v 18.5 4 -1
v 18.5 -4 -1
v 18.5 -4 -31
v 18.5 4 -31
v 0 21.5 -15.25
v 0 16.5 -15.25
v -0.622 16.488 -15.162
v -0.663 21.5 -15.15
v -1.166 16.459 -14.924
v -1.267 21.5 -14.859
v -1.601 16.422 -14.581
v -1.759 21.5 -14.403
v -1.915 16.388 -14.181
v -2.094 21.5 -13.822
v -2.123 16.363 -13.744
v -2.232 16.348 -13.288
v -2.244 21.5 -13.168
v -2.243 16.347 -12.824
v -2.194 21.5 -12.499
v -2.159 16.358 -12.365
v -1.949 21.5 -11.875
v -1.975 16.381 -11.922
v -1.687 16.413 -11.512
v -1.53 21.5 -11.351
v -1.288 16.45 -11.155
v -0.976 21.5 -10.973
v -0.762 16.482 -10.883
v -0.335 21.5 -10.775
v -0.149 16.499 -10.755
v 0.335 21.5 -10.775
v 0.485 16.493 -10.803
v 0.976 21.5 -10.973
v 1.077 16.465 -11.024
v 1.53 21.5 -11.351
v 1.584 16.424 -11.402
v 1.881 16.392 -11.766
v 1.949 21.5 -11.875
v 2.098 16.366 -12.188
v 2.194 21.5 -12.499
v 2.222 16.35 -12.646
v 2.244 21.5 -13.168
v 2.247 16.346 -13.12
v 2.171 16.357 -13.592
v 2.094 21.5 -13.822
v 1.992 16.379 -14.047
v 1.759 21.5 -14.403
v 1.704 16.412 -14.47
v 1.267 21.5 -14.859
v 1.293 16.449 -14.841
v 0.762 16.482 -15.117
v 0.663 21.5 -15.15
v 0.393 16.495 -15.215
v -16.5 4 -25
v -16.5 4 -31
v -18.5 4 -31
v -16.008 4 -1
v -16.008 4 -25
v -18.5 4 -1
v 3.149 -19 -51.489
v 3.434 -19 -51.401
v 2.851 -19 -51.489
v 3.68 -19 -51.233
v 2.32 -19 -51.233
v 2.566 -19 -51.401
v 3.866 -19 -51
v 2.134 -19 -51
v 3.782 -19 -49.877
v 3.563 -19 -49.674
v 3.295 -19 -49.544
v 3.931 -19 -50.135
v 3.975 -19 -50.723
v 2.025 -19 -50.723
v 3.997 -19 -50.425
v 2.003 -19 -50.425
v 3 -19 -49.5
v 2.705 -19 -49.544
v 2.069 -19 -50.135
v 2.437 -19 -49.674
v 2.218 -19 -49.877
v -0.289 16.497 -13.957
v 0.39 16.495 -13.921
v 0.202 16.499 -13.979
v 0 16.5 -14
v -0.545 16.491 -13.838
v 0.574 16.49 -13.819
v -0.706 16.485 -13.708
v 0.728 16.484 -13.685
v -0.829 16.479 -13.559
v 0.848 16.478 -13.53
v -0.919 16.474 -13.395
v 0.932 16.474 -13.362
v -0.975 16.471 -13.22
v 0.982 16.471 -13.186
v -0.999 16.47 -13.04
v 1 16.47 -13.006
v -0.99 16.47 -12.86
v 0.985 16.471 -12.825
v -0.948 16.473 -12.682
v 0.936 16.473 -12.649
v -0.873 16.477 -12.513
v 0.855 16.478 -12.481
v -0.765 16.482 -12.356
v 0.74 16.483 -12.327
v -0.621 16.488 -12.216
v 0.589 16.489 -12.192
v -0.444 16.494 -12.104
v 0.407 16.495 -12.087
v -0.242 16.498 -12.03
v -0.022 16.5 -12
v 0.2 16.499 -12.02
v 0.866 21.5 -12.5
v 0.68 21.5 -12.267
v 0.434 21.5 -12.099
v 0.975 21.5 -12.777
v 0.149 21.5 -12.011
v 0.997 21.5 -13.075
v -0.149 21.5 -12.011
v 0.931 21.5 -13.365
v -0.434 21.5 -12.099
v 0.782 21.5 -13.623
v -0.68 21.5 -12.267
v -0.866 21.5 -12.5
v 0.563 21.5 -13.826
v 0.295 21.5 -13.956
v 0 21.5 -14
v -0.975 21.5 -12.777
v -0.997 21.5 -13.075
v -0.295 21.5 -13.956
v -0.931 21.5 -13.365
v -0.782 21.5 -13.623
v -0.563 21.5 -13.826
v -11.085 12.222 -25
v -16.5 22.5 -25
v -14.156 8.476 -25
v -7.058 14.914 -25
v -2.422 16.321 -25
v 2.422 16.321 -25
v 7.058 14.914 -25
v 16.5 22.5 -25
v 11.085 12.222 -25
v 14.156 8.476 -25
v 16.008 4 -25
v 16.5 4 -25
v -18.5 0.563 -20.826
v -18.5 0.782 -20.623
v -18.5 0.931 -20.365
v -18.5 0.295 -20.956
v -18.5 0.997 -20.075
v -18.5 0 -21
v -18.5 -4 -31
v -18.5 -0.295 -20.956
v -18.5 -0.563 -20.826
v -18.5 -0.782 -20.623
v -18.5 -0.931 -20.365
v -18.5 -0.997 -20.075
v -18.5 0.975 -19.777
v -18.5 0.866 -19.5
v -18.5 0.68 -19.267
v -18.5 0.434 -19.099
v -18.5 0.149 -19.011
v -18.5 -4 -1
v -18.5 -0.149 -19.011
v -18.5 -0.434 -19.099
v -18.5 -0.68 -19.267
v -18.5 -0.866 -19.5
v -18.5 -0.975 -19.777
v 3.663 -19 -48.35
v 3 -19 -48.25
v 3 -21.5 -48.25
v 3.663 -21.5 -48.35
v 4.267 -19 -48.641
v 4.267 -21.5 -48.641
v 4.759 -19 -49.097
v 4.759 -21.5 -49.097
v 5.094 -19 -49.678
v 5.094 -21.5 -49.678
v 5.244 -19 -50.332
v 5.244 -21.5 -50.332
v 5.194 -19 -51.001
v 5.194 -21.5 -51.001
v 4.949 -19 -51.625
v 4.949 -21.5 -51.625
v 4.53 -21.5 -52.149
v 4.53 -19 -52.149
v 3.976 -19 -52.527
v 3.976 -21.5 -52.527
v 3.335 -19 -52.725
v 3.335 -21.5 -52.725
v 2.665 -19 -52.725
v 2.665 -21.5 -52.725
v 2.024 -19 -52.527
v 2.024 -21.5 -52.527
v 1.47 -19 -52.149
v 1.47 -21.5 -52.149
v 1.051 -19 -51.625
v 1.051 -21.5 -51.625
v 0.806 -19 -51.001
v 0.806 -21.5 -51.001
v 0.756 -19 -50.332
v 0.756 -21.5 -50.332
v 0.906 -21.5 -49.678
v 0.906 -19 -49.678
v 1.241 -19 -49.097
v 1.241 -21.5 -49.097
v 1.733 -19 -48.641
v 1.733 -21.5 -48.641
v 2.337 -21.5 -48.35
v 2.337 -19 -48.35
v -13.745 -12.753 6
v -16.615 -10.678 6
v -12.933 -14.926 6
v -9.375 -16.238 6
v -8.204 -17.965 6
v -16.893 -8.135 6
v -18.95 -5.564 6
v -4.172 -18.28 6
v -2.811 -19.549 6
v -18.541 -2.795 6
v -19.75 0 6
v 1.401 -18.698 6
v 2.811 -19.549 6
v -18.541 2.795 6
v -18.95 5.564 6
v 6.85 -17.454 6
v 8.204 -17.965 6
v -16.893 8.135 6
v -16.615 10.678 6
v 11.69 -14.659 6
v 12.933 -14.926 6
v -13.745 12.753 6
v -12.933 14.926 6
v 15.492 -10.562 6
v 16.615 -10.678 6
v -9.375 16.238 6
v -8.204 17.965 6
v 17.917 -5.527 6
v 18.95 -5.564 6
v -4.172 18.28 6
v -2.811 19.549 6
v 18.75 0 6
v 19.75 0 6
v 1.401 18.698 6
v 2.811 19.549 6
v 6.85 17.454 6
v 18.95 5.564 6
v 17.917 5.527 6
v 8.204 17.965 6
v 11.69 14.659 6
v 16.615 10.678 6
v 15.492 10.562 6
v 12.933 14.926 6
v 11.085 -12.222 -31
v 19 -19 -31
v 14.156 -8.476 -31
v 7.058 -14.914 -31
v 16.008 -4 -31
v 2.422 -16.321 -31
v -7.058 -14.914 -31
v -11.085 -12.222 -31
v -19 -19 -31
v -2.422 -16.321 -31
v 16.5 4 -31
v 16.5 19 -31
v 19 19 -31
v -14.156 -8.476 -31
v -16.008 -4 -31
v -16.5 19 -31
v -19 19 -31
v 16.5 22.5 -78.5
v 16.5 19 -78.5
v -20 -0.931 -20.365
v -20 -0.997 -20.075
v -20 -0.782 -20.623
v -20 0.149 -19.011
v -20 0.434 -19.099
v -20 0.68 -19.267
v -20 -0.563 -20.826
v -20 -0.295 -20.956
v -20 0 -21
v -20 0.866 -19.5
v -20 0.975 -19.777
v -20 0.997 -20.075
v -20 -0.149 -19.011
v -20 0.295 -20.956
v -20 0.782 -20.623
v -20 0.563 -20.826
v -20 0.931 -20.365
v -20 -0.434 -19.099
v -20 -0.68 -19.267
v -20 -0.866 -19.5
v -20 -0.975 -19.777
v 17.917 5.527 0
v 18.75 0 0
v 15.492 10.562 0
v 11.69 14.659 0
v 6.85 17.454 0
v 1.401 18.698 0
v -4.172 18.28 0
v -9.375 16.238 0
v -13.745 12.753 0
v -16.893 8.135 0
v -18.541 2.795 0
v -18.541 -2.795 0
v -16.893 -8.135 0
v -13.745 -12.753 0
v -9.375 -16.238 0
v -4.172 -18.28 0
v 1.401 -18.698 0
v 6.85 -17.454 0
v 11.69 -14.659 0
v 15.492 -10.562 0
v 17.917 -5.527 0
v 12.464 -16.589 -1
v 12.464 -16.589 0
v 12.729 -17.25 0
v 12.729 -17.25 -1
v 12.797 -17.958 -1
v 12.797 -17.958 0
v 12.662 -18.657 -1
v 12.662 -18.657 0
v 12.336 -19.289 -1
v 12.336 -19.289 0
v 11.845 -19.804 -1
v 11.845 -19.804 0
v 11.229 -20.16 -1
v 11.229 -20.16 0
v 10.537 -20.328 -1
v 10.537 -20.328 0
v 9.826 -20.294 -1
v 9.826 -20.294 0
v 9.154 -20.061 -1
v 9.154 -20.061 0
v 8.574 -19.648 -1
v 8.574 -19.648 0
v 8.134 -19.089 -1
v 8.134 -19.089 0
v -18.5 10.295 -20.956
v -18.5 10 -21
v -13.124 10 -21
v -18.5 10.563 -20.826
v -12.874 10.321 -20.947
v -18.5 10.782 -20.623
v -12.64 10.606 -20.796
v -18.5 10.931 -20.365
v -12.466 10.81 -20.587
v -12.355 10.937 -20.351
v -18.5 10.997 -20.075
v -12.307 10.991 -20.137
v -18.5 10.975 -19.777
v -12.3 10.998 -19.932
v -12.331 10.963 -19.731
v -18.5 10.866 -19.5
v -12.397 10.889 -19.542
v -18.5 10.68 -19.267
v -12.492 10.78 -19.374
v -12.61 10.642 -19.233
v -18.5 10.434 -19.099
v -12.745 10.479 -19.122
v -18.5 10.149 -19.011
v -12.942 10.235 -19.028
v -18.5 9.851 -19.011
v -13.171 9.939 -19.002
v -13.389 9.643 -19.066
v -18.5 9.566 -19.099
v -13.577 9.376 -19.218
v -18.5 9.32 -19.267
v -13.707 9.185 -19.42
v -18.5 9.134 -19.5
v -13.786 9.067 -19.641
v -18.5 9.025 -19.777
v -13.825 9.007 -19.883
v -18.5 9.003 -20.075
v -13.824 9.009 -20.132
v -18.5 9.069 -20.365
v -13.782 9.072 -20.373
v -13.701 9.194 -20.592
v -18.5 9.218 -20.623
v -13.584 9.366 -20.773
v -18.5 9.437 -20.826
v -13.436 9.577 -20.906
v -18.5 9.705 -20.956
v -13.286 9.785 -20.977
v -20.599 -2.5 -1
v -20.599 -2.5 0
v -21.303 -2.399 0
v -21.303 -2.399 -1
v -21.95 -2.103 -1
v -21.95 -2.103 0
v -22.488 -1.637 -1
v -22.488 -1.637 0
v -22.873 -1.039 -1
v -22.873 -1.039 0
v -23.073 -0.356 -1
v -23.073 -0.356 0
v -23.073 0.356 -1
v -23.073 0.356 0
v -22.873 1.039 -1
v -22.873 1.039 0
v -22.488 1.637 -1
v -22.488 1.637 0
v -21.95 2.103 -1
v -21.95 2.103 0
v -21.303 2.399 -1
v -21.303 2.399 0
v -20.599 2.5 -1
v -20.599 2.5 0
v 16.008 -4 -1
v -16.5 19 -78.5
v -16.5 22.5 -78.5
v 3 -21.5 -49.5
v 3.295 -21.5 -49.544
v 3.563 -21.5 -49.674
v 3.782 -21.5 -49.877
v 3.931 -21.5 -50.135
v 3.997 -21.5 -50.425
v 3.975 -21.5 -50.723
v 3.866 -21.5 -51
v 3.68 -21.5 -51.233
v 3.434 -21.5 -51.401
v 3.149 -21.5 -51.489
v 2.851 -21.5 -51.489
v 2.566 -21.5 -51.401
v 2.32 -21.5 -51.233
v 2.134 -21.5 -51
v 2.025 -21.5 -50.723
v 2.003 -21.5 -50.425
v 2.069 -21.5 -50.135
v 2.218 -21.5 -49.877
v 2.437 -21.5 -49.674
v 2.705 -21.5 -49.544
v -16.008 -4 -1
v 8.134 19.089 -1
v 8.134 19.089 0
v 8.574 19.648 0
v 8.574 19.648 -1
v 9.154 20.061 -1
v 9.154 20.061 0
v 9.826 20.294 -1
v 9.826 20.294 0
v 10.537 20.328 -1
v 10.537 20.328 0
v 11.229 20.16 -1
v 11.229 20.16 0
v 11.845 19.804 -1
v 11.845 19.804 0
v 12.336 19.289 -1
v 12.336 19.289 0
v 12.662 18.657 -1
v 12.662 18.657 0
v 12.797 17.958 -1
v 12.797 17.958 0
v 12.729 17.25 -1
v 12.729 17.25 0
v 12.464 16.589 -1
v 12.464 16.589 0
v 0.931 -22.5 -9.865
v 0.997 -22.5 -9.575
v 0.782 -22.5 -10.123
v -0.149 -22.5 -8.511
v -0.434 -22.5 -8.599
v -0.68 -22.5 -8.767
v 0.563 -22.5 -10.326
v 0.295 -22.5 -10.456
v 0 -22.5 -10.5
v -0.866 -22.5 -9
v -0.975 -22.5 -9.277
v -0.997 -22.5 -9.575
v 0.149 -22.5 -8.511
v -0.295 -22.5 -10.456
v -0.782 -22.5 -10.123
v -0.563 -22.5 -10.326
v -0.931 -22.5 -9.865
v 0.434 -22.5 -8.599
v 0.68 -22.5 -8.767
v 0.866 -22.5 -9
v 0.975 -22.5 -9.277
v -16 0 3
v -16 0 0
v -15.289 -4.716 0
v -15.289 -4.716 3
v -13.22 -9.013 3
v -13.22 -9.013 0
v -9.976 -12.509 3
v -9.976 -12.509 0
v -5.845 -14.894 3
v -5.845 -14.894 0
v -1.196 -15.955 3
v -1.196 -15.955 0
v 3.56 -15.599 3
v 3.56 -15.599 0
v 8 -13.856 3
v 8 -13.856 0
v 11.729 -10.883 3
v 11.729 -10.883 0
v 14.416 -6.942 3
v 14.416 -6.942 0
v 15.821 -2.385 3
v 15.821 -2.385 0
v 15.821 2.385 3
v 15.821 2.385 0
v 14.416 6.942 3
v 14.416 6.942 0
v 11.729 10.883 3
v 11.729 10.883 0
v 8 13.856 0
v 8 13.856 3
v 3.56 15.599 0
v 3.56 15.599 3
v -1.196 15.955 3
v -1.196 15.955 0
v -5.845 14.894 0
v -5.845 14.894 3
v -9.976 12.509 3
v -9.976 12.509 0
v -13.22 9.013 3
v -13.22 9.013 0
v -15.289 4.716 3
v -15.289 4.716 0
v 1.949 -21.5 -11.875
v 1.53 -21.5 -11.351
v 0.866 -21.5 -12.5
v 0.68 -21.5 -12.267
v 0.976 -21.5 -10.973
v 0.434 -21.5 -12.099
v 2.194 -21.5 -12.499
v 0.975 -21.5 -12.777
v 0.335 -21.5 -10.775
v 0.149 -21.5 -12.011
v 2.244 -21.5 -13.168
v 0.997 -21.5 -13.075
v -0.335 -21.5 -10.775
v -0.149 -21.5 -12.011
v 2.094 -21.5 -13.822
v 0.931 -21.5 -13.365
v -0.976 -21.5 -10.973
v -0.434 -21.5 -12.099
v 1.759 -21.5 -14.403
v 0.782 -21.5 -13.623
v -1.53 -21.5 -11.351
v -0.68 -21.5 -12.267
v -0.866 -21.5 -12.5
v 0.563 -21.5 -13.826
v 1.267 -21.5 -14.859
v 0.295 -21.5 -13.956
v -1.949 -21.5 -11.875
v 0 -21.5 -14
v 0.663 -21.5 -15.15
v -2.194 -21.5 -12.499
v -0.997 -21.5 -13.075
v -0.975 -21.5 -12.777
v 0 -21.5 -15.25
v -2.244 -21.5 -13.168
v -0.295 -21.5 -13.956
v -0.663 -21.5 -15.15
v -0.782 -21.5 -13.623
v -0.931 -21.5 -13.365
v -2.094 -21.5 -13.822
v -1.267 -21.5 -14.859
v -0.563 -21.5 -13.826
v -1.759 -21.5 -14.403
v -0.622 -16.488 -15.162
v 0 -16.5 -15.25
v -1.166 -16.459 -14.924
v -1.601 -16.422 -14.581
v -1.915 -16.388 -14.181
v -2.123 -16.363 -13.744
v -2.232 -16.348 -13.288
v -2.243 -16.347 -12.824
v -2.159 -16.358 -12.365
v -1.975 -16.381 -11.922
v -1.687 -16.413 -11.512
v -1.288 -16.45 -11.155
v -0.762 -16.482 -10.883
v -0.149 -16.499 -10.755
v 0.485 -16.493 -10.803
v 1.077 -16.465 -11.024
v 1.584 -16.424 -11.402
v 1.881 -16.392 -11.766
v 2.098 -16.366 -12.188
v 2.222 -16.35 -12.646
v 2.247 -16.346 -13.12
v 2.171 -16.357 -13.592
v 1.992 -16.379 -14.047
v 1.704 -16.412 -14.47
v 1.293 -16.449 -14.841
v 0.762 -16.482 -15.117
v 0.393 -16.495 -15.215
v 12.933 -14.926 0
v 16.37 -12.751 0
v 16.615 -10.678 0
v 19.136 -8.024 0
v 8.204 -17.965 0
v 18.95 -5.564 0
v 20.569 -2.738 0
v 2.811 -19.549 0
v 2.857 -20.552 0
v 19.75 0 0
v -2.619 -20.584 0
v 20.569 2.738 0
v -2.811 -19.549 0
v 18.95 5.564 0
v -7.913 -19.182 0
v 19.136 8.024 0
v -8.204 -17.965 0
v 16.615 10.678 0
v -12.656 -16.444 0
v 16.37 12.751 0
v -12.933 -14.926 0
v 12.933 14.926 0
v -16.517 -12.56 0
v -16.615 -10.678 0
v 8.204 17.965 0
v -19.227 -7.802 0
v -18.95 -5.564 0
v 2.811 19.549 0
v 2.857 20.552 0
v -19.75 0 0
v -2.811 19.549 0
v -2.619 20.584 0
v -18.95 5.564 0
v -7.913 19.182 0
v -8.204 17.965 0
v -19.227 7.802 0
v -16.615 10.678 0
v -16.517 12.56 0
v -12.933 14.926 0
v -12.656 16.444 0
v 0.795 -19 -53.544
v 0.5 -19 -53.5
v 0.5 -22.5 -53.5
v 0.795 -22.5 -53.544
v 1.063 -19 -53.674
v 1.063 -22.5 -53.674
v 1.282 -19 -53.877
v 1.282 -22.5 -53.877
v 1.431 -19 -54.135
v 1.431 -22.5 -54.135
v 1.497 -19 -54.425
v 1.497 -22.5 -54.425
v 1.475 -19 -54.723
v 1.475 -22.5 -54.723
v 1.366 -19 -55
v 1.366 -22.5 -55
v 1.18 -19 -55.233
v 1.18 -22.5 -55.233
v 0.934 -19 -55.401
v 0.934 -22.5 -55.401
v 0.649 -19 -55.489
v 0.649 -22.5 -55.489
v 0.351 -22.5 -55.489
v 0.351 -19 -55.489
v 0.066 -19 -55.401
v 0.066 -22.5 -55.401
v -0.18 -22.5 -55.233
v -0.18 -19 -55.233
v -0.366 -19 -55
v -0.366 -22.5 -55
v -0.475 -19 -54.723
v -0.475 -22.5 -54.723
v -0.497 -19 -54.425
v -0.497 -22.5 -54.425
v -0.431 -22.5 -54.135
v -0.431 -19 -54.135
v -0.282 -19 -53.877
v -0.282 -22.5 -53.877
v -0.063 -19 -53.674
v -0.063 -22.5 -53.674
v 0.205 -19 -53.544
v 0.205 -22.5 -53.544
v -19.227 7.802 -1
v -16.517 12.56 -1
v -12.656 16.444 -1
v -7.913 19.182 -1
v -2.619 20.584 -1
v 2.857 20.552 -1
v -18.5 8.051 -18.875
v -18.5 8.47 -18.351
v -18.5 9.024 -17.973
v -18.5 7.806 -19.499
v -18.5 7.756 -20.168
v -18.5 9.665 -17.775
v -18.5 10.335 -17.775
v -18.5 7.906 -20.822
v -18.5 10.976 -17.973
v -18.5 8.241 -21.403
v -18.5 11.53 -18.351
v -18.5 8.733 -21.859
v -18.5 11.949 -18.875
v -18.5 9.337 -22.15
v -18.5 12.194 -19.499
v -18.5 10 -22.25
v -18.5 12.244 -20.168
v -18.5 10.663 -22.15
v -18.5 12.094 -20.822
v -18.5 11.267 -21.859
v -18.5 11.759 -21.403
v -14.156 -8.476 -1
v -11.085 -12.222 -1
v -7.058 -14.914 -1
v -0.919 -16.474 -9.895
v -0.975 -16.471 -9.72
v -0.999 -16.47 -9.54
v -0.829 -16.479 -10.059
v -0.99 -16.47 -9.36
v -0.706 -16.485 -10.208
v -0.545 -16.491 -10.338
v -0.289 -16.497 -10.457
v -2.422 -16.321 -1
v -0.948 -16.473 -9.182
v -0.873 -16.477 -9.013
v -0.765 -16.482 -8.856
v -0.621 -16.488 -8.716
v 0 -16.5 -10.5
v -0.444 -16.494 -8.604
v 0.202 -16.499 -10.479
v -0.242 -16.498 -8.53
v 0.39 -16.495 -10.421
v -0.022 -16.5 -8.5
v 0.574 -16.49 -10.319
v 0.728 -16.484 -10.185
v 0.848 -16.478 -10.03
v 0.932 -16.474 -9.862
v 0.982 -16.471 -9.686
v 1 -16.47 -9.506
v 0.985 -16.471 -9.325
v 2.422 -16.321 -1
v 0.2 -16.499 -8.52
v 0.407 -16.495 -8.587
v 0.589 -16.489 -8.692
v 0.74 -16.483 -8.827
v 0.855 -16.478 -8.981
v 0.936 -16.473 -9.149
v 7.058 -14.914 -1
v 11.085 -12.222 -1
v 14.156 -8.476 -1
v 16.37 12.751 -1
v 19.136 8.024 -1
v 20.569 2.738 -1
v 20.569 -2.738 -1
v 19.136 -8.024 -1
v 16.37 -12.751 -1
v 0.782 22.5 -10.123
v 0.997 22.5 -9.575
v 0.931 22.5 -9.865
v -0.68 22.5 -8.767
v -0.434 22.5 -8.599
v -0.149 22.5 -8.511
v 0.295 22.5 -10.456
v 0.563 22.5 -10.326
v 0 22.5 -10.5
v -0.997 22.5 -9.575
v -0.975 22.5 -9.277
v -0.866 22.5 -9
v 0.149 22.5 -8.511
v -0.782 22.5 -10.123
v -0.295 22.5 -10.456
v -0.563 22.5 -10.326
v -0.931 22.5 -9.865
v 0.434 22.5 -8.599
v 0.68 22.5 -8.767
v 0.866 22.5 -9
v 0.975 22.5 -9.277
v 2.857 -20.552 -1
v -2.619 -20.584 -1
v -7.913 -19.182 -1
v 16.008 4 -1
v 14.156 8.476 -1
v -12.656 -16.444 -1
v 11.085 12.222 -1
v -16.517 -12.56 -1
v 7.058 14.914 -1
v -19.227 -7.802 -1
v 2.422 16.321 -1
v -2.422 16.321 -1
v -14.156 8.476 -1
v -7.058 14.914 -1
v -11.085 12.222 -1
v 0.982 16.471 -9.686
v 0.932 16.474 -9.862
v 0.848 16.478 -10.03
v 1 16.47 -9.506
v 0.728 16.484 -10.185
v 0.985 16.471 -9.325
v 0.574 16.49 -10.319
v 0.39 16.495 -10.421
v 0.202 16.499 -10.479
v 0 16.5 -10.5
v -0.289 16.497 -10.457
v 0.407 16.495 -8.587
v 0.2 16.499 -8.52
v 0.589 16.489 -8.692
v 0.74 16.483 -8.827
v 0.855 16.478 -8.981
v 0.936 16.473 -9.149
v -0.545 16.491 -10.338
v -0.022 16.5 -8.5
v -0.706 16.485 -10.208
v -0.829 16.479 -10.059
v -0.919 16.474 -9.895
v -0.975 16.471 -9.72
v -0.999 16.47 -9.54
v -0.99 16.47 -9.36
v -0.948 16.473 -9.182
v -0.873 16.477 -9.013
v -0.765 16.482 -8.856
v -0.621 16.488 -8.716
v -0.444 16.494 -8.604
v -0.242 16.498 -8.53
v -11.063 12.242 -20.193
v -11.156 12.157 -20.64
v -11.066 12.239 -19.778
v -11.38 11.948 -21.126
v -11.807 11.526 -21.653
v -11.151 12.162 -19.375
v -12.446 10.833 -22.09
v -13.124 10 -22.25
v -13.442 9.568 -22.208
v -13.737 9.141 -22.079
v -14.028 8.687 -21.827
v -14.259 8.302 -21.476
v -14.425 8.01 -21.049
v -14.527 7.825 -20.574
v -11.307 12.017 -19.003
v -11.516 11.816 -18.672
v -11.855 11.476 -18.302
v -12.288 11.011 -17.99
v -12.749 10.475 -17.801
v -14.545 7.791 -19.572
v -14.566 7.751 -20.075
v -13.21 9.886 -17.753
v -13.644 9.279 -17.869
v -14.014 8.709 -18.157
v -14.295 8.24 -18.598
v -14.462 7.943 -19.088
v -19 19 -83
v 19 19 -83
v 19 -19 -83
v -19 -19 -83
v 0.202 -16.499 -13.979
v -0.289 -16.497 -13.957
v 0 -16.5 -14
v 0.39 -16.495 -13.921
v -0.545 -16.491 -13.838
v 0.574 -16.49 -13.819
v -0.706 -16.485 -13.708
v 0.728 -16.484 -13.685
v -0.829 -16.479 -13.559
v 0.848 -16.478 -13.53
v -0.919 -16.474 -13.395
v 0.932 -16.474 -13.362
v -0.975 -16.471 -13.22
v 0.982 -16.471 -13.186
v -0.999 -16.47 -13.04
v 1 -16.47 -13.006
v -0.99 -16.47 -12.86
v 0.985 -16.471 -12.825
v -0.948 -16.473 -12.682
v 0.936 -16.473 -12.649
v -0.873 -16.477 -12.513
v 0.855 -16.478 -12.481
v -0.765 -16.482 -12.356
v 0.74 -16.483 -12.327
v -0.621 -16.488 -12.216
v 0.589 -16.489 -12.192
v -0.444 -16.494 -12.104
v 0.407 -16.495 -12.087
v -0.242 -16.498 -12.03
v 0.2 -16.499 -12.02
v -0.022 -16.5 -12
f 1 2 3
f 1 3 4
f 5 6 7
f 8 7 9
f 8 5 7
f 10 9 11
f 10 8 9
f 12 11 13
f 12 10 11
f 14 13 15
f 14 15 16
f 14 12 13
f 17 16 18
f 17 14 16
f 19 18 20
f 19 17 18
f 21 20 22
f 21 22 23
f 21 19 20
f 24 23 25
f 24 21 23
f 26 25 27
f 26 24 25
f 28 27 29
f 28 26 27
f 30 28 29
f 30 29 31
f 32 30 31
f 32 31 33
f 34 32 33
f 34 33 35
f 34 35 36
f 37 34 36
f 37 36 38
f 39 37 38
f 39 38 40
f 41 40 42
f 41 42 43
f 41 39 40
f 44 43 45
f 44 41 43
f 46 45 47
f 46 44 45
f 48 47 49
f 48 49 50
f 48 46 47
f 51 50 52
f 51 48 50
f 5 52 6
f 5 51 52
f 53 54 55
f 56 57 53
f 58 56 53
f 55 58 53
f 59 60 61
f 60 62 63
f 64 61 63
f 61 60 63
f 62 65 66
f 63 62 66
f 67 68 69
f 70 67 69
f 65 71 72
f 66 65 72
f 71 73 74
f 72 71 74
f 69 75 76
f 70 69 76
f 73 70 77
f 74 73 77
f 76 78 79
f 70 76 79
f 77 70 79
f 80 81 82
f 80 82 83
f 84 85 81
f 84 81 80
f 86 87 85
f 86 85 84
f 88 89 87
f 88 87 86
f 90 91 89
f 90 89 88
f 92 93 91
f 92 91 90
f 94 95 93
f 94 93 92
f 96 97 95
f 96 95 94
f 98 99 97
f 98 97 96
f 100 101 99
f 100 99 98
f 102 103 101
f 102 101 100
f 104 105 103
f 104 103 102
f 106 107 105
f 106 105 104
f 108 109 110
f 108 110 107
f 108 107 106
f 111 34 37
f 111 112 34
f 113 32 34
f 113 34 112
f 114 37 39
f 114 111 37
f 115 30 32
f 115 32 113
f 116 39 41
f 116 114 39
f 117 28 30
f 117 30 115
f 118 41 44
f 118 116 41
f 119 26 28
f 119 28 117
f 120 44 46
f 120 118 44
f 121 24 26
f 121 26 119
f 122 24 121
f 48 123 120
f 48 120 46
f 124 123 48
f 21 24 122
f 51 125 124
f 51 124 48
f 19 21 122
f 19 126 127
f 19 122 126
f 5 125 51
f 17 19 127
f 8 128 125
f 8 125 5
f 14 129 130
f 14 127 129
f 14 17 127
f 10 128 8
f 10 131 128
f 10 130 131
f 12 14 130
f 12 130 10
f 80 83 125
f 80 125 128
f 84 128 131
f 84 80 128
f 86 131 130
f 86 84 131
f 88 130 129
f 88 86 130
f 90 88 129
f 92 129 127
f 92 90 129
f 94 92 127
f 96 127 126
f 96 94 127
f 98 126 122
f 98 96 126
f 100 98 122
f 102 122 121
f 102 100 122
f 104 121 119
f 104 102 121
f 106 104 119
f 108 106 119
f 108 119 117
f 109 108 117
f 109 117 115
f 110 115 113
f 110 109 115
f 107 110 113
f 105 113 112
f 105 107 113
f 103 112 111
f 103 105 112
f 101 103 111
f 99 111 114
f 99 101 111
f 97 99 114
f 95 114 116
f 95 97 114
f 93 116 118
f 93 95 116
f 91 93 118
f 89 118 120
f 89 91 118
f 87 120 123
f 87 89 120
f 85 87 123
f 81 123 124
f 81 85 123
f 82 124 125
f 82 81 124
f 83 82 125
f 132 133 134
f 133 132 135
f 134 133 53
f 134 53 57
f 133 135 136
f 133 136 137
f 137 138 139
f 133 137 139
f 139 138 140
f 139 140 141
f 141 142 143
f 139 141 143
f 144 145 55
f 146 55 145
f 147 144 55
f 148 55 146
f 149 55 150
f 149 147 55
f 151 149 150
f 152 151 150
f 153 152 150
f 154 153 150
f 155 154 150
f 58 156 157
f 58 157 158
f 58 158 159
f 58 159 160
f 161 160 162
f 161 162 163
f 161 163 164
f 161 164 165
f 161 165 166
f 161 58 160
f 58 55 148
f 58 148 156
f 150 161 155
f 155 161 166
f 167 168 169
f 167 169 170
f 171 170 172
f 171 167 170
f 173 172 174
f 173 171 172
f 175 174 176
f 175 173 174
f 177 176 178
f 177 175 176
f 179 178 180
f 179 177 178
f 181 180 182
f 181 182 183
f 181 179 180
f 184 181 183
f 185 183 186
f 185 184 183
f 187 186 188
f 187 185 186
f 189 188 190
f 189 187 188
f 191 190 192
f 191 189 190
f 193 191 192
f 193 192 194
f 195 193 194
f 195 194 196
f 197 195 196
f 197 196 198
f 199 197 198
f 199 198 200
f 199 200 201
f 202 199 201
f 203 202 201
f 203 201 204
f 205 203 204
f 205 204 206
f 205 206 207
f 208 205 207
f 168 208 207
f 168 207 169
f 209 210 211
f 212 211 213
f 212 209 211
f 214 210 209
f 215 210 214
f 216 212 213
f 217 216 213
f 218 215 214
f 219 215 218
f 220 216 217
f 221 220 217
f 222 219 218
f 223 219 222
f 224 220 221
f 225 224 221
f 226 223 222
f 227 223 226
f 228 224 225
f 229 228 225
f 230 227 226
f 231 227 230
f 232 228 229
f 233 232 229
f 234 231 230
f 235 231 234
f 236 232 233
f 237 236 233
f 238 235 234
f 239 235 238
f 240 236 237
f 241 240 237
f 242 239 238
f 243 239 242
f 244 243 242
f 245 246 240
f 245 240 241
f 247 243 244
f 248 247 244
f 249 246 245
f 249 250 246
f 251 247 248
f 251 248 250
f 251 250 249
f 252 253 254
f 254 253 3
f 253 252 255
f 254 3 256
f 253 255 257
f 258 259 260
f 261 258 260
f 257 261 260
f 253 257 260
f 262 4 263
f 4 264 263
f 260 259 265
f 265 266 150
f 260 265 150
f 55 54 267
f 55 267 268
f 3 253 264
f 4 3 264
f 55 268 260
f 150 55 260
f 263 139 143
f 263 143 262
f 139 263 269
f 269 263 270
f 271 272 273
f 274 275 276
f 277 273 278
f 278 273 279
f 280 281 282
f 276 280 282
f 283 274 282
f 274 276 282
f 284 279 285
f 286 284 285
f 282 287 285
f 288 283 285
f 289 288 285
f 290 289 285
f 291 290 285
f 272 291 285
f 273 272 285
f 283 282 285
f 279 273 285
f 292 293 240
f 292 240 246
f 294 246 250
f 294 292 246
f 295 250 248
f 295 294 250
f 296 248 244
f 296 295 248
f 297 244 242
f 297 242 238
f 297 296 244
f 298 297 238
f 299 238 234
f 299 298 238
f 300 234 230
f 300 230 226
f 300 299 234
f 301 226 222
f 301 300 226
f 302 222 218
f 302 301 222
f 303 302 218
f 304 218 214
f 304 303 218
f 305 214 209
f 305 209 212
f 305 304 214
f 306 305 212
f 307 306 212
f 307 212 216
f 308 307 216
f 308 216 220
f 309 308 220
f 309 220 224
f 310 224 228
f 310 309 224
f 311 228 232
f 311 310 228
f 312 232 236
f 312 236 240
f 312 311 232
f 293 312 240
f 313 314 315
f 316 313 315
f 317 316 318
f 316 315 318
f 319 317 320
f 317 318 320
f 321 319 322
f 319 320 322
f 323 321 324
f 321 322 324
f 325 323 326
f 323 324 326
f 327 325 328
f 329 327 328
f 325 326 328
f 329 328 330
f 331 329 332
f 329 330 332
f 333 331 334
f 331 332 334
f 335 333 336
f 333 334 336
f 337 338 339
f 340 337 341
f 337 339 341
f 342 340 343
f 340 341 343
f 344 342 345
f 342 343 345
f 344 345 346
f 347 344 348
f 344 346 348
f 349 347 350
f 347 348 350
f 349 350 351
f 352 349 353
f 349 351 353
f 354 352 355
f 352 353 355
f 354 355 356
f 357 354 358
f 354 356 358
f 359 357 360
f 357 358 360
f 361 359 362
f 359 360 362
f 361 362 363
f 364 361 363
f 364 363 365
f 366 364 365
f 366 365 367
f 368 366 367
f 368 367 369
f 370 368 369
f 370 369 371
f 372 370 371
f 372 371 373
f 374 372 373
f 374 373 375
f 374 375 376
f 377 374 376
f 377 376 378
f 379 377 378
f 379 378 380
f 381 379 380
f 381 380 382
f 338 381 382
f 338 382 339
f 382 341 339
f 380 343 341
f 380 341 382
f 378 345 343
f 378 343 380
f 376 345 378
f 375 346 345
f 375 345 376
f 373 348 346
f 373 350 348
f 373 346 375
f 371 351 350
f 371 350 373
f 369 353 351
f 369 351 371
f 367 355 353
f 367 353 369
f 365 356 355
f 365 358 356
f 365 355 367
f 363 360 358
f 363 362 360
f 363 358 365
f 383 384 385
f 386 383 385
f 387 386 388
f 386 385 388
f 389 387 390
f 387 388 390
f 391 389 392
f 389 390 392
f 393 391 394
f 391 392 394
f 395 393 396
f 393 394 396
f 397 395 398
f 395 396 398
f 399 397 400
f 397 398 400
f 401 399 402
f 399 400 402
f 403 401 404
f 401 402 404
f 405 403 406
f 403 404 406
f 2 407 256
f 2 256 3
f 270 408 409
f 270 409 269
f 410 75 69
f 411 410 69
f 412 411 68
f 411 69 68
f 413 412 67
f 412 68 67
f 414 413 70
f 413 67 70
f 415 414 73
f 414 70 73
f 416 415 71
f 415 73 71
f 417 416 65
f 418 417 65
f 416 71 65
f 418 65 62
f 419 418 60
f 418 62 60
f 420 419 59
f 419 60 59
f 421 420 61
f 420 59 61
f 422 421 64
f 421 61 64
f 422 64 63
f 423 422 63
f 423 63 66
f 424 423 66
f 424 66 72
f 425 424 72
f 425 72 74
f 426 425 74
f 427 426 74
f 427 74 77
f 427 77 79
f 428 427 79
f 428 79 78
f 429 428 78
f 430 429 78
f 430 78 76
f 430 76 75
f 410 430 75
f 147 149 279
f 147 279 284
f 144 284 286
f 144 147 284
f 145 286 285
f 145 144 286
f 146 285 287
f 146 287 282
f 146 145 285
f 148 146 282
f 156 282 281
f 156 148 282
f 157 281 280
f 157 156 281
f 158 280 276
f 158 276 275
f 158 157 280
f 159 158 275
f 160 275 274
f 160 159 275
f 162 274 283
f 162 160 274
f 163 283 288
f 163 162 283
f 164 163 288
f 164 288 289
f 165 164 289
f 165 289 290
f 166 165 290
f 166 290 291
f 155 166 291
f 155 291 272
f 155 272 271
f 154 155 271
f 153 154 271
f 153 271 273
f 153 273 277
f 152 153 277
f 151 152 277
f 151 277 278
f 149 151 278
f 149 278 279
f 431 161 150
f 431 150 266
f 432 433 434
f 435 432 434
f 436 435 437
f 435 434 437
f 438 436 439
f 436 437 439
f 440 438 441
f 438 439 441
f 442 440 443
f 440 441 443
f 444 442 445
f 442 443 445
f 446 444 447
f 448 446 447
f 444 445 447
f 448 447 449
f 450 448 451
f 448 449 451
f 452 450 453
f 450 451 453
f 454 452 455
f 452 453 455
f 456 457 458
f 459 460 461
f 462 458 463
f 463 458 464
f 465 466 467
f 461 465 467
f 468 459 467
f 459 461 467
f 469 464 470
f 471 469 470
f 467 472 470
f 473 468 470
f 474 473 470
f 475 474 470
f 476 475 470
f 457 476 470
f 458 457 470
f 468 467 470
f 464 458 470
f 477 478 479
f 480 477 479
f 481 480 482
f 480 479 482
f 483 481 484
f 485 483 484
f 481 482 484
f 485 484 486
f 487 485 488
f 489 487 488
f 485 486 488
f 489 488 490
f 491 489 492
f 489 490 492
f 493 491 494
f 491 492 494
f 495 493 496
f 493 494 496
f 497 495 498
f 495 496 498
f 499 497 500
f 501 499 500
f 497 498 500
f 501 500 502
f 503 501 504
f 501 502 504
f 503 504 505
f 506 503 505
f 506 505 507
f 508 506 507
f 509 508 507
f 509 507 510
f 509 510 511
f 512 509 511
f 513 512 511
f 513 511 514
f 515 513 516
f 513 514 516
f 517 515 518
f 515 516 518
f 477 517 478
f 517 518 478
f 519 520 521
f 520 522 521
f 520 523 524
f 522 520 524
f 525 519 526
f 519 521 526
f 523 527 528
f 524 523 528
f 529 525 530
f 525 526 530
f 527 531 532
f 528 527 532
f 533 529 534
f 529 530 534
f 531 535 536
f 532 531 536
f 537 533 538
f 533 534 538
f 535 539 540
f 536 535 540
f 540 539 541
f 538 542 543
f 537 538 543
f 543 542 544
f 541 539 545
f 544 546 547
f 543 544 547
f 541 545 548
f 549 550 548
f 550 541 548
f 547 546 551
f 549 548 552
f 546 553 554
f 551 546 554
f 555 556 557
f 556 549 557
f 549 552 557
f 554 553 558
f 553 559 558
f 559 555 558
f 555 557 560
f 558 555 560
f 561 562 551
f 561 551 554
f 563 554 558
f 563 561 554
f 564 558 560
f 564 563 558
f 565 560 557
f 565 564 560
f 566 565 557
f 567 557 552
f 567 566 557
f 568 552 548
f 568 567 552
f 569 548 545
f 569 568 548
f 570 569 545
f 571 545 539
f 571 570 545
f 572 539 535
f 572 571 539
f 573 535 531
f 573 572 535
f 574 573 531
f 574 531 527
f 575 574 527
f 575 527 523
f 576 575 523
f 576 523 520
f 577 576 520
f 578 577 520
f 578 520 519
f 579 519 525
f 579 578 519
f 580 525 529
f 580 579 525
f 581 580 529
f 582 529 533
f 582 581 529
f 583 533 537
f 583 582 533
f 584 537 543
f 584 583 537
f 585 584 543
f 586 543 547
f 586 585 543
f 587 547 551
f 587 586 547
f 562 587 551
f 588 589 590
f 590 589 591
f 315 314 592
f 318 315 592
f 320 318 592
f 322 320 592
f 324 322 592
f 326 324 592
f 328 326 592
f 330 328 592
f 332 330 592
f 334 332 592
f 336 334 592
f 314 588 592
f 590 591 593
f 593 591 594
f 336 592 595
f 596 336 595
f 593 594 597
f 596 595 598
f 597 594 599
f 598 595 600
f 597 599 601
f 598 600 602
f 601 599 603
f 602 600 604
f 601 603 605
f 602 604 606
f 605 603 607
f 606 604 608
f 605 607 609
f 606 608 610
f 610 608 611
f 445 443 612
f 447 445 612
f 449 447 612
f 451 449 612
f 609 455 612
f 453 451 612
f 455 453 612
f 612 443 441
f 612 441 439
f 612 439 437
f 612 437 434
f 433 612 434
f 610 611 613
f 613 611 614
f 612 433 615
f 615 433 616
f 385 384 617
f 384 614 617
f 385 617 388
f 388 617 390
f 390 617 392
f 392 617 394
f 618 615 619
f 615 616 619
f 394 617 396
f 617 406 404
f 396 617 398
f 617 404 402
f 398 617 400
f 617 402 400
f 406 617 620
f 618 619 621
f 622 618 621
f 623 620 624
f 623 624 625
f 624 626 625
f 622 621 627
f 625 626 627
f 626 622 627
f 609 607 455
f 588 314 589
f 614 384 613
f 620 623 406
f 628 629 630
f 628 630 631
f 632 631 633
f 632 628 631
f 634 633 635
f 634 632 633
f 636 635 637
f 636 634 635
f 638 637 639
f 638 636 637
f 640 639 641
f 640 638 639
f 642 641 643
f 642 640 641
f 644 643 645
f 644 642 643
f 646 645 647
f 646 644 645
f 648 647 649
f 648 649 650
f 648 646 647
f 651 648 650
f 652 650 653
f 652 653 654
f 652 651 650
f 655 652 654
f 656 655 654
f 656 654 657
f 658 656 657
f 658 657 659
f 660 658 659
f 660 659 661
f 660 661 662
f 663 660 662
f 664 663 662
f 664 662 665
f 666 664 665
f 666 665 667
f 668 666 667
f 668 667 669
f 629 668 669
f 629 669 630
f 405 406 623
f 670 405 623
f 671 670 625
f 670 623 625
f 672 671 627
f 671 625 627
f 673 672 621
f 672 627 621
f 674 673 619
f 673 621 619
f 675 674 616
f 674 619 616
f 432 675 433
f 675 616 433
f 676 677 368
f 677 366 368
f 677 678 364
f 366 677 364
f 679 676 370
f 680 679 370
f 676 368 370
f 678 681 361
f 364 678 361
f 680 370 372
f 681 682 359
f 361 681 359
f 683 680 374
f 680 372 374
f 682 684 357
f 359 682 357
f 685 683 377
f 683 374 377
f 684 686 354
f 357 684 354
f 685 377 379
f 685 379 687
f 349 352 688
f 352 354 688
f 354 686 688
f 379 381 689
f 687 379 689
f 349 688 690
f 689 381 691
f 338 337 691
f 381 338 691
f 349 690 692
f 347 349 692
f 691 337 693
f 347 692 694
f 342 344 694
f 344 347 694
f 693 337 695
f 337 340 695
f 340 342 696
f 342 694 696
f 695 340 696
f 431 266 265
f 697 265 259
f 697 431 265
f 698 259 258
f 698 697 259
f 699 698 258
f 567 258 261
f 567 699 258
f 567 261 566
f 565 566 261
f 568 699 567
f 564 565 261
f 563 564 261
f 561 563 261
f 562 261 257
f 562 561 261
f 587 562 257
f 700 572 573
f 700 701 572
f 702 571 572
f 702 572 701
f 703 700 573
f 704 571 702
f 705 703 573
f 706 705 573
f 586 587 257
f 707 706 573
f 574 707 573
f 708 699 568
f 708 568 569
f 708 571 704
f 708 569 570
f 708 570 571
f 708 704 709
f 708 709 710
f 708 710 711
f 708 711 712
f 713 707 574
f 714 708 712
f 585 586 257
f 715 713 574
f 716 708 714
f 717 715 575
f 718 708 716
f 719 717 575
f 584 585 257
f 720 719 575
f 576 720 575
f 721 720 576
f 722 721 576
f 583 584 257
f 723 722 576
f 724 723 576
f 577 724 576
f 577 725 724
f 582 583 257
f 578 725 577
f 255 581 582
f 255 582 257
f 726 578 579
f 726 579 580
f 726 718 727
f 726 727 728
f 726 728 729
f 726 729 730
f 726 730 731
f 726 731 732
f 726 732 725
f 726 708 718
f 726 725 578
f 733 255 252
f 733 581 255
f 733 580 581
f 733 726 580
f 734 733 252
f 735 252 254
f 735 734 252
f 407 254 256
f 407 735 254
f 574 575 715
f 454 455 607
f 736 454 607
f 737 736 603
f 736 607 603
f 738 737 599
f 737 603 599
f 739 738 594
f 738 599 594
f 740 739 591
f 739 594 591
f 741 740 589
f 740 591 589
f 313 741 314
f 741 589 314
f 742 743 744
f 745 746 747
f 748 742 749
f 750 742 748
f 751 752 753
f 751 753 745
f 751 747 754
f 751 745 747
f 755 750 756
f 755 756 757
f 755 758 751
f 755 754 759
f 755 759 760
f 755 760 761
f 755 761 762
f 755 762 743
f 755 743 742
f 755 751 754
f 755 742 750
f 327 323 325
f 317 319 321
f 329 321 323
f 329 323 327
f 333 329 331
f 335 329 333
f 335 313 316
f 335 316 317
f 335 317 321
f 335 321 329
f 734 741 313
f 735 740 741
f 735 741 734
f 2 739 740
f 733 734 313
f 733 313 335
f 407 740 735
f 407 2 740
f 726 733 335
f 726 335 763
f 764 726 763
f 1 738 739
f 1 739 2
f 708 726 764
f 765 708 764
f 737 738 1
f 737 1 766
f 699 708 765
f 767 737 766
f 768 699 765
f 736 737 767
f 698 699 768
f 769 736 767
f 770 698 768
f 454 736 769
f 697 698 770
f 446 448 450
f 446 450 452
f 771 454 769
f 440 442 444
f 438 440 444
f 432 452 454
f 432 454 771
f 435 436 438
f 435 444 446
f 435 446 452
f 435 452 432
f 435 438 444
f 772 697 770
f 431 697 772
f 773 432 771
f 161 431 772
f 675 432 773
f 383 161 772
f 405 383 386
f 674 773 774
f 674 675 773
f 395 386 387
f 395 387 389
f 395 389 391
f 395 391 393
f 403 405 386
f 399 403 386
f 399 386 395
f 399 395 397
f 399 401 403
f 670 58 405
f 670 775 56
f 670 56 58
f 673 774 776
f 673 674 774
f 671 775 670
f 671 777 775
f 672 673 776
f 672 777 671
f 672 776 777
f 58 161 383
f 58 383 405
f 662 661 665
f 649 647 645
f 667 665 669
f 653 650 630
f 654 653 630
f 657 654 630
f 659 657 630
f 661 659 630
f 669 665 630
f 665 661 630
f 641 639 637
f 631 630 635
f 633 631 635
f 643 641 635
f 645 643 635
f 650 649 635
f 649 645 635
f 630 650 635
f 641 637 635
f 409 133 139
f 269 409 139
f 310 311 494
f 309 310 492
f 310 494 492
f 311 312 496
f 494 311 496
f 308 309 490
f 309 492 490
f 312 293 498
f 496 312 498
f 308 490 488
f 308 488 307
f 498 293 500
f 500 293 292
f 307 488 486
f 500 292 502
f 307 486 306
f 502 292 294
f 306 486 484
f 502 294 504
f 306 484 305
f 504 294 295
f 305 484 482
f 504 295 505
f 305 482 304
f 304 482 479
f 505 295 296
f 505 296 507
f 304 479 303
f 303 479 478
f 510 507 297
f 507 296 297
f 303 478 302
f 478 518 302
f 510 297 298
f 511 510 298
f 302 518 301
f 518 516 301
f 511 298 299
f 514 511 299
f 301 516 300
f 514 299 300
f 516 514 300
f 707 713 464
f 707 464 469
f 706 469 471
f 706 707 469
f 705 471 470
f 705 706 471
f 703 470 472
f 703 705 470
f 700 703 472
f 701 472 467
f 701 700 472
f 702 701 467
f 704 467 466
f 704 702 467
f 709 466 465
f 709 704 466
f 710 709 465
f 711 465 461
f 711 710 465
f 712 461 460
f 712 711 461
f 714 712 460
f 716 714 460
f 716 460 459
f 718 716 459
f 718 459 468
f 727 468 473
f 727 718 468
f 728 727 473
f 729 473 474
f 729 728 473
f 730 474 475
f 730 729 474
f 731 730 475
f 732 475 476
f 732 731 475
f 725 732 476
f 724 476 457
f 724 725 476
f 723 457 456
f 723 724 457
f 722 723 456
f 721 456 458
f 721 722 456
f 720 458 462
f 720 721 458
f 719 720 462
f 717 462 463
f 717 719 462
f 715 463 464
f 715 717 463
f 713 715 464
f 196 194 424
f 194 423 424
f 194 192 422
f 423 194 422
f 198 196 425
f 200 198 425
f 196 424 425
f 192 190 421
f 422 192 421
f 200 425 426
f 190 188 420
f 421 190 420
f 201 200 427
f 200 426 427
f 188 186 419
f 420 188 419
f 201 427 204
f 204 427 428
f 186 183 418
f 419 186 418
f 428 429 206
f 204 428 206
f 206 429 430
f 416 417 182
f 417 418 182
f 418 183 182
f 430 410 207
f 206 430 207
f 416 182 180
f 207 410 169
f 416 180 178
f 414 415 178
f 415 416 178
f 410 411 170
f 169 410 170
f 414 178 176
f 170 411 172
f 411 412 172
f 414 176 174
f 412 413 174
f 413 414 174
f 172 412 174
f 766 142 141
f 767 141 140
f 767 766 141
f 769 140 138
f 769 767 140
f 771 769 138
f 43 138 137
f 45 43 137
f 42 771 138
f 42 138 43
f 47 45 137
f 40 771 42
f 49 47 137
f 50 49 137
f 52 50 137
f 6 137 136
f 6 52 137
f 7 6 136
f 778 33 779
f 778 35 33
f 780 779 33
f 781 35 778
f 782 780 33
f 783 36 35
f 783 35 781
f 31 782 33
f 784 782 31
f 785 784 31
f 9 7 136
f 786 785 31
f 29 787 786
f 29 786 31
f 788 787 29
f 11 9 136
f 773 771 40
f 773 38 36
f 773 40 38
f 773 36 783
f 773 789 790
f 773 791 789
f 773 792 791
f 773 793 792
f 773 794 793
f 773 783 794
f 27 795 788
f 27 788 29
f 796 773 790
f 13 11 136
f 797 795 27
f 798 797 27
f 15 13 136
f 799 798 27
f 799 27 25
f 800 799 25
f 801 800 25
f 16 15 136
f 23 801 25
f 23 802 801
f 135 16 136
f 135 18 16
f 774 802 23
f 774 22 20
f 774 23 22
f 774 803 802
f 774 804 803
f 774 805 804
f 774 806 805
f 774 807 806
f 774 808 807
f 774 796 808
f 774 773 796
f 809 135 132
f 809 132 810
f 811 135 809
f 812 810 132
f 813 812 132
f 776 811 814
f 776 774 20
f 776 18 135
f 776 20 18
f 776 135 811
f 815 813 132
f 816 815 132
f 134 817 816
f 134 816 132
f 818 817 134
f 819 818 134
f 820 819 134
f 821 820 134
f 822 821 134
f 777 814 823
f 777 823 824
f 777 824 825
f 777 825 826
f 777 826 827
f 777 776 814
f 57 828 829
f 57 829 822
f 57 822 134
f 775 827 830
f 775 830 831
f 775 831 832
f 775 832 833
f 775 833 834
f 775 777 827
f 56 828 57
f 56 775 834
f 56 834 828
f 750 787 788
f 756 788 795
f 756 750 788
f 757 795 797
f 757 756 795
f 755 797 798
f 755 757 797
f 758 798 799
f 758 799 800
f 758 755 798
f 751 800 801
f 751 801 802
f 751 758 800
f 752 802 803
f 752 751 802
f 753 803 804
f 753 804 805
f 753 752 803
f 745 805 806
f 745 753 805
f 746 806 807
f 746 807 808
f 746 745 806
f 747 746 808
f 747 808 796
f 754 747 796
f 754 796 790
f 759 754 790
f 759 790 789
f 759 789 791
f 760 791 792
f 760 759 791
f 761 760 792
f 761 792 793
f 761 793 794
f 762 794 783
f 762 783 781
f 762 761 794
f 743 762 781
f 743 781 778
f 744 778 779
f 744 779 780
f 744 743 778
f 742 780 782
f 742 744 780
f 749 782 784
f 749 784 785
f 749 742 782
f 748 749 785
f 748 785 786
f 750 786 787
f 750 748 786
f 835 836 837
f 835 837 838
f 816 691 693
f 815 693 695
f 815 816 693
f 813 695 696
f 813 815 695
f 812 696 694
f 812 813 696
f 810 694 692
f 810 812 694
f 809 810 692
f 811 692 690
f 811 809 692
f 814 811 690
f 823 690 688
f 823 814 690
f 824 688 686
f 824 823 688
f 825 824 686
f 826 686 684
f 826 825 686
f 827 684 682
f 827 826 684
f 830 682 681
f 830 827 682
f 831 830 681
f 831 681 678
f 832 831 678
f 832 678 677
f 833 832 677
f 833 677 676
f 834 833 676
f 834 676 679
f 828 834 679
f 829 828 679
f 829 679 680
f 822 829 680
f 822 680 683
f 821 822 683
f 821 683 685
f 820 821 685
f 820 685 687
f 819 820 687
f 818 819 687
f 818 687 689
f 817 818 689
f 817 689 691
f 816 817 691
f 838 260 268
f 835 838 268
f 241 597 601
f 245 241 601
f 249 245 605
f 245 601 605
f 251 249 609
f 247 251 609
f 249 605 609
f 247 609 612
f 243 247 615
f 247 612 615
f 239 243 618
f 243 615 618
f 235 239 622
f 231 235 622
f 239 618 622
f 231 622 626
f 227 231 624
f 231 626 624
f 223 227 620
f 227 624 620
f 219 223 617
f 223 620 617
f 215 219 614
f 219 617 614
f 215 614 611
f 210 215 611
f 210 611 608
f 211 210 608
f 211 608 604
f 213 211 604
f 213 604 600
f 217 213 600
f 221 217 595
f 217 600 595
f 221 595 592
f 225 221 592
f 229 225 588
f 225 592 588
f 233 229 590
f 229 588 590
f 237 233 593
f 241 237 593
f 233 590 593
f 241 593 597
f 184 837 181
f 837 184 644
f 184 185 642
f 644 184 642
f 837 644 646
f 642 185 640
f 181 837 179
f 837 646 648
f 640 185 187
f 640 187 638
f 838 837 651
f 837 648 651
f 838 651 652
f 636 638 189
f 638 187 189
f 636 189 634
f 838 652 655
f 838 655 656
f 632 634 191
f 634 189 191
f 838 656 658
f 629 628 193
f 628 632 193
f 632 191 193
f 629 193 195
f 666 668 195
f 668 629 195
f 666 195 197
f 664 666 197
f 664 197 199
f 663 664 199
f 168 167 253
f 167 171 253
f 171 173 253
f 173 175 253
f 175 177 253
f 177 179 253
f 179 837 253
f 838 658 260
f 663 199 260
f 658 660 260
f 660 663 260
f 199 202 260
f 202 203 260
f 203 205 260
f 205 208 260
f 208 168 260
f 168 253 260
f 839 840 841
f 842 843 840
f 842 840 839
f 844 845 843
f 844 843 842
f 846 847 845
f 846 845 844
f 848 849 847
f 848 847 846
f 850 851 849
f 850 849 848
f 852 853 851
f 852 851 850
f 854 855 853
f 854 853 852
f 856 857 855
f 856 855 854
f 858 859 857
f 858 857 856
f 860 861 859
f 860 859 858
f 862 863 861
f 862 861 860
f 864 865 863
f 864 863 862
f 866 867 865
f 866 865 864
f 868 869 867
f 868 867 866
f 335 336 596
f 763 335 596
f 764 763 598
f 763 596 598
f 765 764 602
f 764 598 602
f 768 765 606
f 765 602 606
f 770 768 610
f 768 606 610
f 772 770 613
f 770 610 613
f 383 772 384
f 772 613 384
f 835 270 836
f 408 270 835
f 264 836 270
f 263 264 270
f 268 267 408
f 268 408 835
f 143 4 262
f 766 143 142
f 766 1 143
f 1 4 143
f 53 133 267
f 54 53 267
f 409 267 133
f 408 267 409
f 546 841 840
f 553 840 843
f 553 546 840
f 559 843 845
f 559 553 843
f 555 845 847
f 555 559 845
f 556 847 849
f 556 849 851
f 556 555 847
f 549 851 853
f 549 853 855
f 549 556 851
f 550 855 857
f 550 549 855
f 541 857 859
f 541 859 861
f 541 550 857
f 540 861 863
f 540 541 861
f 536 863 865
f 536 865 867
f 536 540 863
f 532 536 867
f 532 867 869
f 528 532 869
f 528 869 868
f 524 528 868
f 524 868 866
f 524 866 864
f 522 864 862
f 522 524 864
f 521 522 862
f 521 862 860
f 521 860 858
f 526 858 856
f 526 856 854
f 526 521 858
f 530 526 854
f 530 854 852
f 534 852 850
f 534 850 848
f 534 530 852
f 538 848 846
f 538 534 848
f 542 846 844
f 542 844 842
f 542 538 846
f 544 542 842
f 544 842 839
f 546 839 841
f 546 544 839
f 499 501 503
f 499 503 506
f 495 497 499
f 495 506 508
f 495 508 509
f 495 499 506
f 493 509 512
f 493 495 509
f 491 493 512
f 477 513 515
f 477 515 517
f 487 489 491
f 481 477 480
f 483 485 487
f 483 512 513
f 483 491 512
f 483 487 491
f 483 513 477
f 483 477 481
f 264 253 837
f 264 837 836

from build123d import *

# Parameters (mm, degrees)
SKETCH1_R                 = 19.75
SKETCH1_R_2               = 18.75
BOSS_EXTRUDE1_DEPTH       = 6
BOSS_EXTRUDE2_DEPTH       = 1
BOSS_EXTRUDE3_DEPTH       = 70
SKETCH4_R                 = 2.25
SKETCH4_R_2               = 1
BOSS_EXTRUDE4_DEPTH       = 21.5
SKETCH5_R                 = 1
BOSS_EXTRUDE5_DEPTH       = 22.5
SKETCH6_R                 = 2.25
SKETCH6_R_2               = 1
BOSS_EXTRUDE6_DEPTH       = 21.5
SKETCH7_R                 = 1
BOSS_EXTRUDE7_DEPTH       = 22.5
SKETCH8_R                 = 1
BOSS_EXTRUDE8_DEPTH       = 20
SKETCH9_R                 = 2.25
SKETCH9_R_2               = 1
BOSS_EXTRUDE9_DEPTH       = 18.5
SKETCH10_W                = 33
SKETCH10_H                = 53.5
BOSS_EXTRUDE10_DEPTH      = 22.5
BOSS_EXTRUDE11_DEPTH      = 12
BOSS_EXTRUDE11_DEPTH_BACK = 40
SKETCH11_W                = 38
SKETCH11_H                = 38
SKETCH12_R                = 16
BOSS_EXTRUDE12_DEPTH      = 3


with BuildPart() as part:
    # Sketch1 → Boss-Extrude1 (new body)
    with BuildSketch(Plane.XY):
        Circle(SKETCH1_R)
        Circle(SKETCH1_R_2, mode=Mode.SUBTRACT)
    extrude(amount=BOSS_EXTRUDE1_DEPTH)

    # Sketch2 → Boss-Extrude2 (add)
    with BuildSketch(Plane(origin=(0, 0, 0), x_dir=(-1, 0, 0), z_dir=(0, 0, -1))):
        with BuildLine():
            ThreePointArc((-12.464487037, 16.589124838), (-20.75, 0), (-12.464487037, -16.589124838))
            ThreePointArc((-12.464487037, -16.589124838), (-11.549423528, -20.004188348), (-8.134360018, -19.089124838))
            ThreePointArc((-8.134360018, -19.089124838), (10.375, -17.970027129), (20.598847055, -2.5))
            ThreePointArc((20.598847055, -2.5), (23.098847055, 0), (20.598847055, 2.5))
            ThreePointArc((20.598847055, 2.5), (10.375, 17.970027129), (-8.134360018, 19.089124838))
            ThreePointArc((-8.134360018, 19.089124838), (-11.549423528, 20.004188348), (-12.464487037, 16.589124838))
        make_face()
    extrude(amount=BOSS_EXTRUDE2_DEPTH)

    # Sketch3 → Boss-Extrude3 (add)
    with BuildSketch(Plane(origin=(0, 0, -1), x_dir=(-1, 0, 0), z_dir=(0, 0, -1))):
        with BuildLine():
            Line((16.007810594, 4), (18.5, 4))
            Line((18.5, 4), (18.5, -4))
            Line((18.5, -4), (16.007810594, -4))
            ThreePointArc((16.007810594, -4), (0, -16.5), (-16.007810594, -4))
            Line((-16.007810594, -4), (-18.5, -4))
            Line((-18.5, -4), (-18.5, 4))
            Line((-18.5, 4), (-16.007810594, 4))
            ThreePointArc((-16.007810594, 4), (0, 16.5), (16.007810594, 4))
        make_face()
    extrude(amount=BOSS_EXTRUDE3_DEPTH)

    # Sketch4 → Boss-Extrude4 (add, symmetric)
    with BuildSketch(Plane(origin=(0, 0, 0), x_dir=(1, 0, 0), z_dir=(0, 1, 0))):
        with Locations(Location((0, 13, 0), (0, 0, 90))):
            Circle(SKETCH4_R)
        with Locations(Location((0, 13, 0), (0, 0, 90))):
            Circle(SKETCH4_R_2, mode=Mode.SUBTRACT)
    extrude(amount=BOSS_EXTRUDE4_DEPTH, both=True)

    # Sketch5 → Boss-Extrude5 (add, symmetric)
    with BuildSketch(Plane(origin=(0, 0, 0), x_dir=(1, 0, 0), z_dir=(0, 1, 0))):
        with Locations(Location((0, 9.5, 0), (0, 0, 90))):
            Circle(SKETCH5_R)
    extrude(amount=BOSS_EXTRUDE5_DEPTH, both=True)

    # Sketch6 → Boss-Extrude6 (add)
    with BuildSketch(Plane(origin=(0, 0, 0), x_dir=(1, 0, 0), z_dir=(0, 1, 0))):
        with Locations(Location((3, 50.5, 0), (0, 0, 270))):
            Circle(SKETCH6_R)
        with Locations(Location((3, 50.5, 0), (0, 0, 270))):
            Circle(SKETCH6_R_2, mode=Mode.SUBTRACT)
    extrude(amount=-BOSS_EXTRUDE6_DEPTH)

    # Sketch7 → Boss-Extrude7 (add)
    with BuildSketch(Plane(origin=(0, 0, 0), x_dir=(1, 0, 0), z_dir=(0, 1, 0))):
        with Locations(Location((0.5, 54.5, 0), (0, 0, 270))):
            Circle(SKETCH7_R)
    extrude(amount=-BOSS_EXTRUDE7_DEPTH)

    # Sketch8 → Boss-Extrude8 (add)
    with BuildSketch(Plane(origin=(0, 0, 0), x_dir=(0, 0, -1), z_dir=(1, 0, 0))):
        with Locations((20, 0)):
            Circle(SKETCH8_R)
    extrude(amount=-BOSS_EXTRUDE8_DEPTH)

    # Sketch9 → Boss-Extrude9 (add)
    with BuildSketch(Plane(origin=(0, 0, 0), x_dir=(0, 0, -1), z_dir=(1, 0, 0))):
        with Locations((20, 10)):
            Circle(SKETCH9_R)
        with Locations((20, 10)):
            Circle(SKETCH9_R_2, mode=Mode.SUBTRACT)
    extrude(amount=-BOSS_EXTRUDE9_DEPTH)

    # Sketch10 → Boss-Extrude10 (add)
    with BuildSketch(Plane(origin=(0, 0, 0), x_dir=(1, 0, 0), z_dir=(0, 1, 0))):
        with Locations((0, 51.75)):
            Rectangle(SKETCH10_W, SKETCH10_H)
    extrude(amount=BOSS_EXTRUDE10_DEPTH)

    # Sketch11 → Boss-Extrude11 (add, two sides: drawn at the far end of the back side and taken through both)
    with BuildSketch(Plane(origin=(0, 0, -71), x_dir=(-1, 0, 0), z_dir=(0, 0, -1)).offset(-BOSS_EXTRUDE11_DEPTH_BACK)):
        Rectangle(SKETCH11_W, SKETCH11_H)
    extrude(amount=BOSS_EXTRUDE11_DEPTH + BOSS_EXTRUDE11_DEPTH_BACK)

    # Sketch12 → Boss-Extrude12 (add)
    with BuildSketch(Plane.XY):
        with Locations(Location((0, 0, 0), (0, 0, 180))):
            Circle(SKETCH12_R)
    extrude(amount=BOSS_EXTRUDE12_DEPTH)


solid = part.part
